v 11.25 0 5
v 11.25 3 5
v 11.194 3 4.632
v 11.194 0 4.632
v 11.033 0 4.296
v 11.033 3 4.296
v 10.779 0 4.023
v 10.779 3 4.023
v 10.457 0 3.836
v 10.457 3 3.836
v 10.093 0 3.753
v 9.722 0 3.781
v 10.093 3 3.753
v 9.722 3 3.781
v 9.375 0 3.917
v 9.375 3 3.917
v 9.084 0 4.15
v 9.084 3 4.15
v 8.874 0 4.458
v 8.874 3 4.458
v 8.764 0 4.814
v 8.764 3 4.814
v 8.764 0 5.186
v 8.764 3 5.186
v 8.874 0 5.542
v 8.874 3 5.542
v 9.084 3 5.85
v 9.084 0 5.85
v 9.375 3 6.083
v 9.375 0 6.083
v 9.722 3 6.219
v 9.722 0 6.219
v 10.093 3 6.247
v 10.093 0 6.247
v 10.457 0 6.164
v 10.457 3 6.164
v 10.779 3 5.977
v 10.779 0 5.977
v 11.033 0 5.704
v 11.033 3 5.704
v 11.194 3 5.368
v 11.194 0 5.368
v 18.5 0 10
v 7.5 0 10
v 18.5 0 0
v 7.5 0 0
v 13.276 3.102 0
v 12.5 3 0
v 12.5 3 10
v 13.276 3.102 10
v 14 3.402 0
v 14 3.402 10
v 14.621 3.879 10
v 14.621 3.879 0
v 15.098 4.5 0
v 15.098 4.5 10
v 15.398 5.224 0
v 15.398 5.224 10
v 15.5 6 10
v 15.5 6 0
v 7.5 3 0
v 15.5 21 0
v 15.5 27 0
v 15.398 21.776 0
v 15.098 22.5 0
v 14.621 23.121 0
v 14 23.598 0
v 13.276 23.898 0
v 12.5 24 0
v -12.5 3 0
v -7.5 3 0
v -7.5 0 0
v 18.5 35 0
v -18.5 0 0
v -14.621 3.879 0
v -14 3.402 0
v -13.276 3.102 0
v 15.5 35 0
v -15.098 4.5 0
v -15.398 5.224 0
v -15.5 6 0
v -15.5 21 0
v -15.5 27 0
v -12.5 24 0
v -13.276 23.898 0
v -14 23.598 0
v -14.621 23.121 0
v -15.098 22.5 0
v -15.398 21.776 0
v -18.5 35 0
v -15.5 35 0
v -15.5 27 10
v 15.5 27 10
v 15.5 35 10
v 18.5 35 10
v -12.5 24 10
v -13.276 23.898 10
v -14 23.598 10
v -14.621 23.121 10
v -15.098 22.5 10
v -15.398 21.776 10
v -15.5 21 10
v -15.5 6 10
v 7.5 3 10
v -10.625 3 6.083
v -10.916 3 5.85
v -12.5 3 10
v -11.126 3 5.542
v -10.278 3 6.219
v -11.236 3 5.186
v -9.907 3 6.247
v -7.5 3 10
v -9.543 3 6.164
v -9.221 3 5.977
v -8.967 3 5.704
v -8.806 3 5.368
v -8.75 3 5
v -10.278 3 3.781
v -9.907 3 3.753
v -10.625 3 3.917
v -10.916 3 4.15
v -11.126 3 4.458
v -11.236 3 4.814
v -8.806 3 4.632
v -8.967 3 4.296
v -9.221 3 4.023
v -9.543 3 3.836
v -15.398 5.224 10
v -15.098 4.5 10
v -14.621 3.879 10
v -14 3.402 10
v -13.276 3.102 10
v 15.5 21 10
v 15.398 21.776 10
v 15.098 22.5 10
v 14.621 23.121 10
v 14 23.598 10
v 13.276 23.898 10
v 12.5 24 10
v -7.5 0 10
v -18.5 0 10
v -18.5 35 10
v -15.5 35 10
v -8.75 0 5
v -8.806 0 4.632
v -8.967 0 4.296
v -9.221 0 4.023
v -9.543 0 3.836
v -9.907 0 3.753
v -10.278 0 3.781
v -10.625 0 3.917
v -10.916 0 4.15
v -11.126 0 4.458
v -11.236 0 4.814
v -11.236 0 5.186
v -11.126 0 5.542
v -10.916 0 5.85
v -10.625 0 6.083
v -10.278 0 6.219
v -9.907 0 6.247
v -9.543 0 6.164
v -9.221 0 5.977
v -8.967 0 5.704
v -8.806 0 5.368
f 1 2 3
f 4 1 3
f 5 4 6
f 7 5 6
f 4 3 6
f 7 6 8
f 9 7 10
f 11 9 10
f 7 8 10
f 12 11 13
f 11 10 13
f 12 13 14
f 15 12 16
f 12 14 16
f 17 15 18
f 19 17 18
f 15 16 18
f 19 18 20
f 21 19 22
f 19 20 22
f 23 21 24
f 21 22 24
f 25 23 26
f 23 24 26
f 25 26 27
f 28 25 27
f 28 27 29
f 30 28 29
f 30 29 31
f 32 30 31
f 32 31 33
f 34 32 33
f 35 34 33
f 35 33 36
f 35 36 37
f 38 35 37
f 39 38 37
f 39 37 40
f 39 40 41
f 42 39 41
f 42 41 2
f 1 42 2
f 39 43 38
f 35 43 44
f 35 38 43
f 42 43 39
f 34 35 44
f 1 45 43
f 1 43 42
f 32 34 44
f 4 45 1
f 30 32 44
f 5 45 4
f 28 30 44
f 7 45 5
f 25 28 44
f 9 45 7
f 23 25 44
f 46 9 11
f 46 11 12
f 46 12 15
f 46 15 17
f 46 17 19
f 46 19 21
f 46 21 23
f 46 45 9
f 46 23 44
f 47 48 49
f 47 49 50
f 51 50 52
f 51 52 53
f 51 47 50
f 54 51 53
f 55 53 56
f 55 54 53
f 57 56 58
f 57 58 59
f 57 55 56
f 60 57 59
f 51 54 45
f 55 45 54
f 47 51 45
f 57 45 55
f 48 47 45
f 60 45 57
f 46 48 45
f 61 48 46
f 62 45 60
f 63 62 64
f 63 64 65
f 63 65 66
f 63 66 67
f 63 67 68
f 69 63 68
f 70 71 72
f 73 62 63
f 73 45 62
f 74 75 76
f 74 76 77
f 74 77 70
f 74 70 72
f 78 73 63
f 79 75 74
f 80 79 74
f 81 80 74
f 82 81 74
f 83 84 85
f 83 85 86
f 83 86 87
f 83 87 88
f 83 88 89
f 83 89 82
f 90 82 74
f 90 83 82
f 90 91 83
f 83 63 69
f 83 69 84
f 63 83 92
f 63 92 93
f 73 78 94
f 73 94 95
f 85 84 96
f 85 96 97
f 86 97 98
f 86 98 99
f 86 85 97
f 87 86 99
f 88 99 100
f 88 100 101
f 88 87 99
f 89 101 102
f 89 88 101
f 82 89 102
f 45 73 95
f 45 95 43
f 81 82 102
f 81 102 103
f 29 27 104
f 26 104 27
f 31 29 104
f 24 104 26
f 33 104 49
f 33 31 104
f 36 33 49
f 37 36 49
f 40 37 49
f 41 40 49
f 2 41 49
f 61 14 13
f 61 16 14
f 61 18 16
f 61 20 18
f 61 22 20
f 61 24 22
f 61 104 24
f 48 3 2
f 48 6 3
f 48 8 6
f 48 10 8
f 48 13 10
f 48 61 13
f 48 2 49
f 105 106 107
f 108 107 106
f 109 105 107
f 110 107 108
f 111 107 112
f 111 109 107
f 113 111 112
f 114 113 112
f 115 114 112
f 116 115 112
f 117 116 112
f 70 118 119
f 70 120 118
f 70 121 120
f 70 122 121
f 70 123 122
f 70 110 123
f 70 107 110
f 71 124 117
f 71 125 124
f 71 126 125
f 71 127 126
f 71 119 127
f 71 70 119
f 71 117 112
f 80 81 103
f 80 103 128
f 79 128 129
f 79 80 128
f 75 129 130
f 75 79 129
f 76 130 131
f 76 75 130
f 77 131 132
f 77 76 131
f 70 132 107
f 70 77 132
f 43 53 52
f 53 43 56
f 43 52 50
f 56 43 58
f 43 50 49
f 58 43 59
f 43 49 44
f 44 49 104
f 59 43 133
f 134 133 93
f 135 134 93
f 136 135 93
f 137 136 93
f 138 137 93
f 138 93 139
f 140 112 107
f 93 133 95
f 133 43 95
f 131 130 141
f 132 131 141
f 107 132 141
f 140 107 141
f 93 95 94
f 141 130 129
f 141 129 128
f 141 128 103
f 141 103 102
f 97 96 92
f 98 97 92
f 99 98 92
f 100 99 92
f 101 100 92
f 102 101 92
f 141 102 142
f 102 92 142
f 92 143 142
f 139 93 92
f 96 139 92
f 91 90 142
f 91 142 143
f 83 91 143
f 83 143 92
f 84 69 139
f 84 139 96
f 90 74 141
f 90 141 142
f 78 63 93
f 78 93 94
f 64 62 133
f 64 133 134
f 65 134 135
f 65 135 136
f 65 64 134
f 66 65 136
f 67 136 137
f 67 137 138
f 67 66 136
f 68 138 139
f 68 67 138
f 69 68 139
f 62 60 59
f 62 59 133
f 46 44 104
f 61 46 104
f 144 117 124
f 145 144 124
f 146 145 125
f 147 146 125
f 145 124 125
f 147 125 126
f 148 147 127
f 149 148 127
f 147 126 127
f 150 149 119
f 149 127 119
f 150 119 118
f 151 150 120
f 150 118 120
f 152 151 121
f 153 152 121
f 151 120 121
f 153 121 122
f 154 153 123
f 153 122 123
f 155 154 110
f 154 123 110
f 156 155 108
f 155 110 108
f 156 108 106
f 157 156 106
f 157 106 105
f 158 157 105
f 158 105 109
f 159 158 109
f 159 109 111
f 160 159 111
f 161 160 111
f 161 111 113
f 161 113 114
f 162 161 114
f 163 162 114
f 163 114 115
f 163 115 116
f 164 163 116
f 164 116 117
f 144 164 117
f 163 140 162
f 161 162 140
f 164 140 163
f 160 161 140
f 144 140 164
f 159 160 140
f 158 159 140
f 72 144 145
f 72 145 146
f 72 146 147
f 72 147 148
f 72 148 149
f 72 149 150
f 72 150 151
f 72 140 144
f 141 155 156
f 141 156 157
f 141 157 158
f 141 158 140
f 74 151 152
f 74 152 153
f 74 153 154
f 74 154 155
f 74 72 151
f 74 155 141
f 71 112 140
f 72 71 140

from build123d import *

# Parameters (mm, degrees)
BOSS_EXTRUDE1_DEPTH = 10
SKETCH2_R           = 1.25
CUT_EXTRUDE1_DEPTH  = 4


with BuildPart() as part:
    # Sketch1 → Boss-Extrude1 (new body)
    with BuildSketch(Plane.XY):
        with BuildLine():
            Line((-15.5, 27), (15.5, 27))
            Line((15.5, 27), (15.5, 35))
            Line((15.5, 35), (18.5, 35))
            Line((18.5, 35), (18.5, 0))
            Line((18.5, 0), (7.5, 0))
            Line((7.5, 0), (7.5, 3))
            Line((7.5, 3), (12.5, 3))
            ThreePointArc((12.5, 3), (14.621320344, 3.878679656), (15.5, 6))
            Line((15.5, 6), (15.5, 21))
            ThreePointArc((15.5, 21), (14.621320344, 23.121320344), (12.5, 24))
            Line((12.5, 24), (-12.5, 24))
            ThreePointArc((-12.5, 24), (-14.621320344, 23.121320344), (-15.5, 21))
            Line((-15.5, 21), (-15.5, 6))
            ThreePointArc((-15.5, 6), (-14.621320344, 3.878679656), (-12.5, 3))
            Line((-12.5, 3), (-7.5, 3))
            Line((-7.5, 3), (-7.5, 0))
            Line((-7.5, 0), (-18.5, 0))
            Line((-18.5, 0), (-18.5, 35))
            Line((-18.5, 35), (-15.5, 35))
            Line((-15.5, 35), (-15.5, 27))
        make_face()
    extrude(amount=BOSS_EXTRUDE1_DEPTH)

    # Sketch2 → Cut-Extrude1 (cut, through all)
    with BuildSketch(Plane(origin=(0, 3, 0), x_dir=(1, 0, 0), z_dir=(0, 1, 0))):
        with Locations((-10, -5)):
            Circle(SKETCH2_R)
        with Locations((10, -5)):
            Circle(SKETCH2_R)
    extrude(amount=-CUT_EXTRUDE1_DEPTH, mode=Mode.SUBTRACT)


solid = part.part
